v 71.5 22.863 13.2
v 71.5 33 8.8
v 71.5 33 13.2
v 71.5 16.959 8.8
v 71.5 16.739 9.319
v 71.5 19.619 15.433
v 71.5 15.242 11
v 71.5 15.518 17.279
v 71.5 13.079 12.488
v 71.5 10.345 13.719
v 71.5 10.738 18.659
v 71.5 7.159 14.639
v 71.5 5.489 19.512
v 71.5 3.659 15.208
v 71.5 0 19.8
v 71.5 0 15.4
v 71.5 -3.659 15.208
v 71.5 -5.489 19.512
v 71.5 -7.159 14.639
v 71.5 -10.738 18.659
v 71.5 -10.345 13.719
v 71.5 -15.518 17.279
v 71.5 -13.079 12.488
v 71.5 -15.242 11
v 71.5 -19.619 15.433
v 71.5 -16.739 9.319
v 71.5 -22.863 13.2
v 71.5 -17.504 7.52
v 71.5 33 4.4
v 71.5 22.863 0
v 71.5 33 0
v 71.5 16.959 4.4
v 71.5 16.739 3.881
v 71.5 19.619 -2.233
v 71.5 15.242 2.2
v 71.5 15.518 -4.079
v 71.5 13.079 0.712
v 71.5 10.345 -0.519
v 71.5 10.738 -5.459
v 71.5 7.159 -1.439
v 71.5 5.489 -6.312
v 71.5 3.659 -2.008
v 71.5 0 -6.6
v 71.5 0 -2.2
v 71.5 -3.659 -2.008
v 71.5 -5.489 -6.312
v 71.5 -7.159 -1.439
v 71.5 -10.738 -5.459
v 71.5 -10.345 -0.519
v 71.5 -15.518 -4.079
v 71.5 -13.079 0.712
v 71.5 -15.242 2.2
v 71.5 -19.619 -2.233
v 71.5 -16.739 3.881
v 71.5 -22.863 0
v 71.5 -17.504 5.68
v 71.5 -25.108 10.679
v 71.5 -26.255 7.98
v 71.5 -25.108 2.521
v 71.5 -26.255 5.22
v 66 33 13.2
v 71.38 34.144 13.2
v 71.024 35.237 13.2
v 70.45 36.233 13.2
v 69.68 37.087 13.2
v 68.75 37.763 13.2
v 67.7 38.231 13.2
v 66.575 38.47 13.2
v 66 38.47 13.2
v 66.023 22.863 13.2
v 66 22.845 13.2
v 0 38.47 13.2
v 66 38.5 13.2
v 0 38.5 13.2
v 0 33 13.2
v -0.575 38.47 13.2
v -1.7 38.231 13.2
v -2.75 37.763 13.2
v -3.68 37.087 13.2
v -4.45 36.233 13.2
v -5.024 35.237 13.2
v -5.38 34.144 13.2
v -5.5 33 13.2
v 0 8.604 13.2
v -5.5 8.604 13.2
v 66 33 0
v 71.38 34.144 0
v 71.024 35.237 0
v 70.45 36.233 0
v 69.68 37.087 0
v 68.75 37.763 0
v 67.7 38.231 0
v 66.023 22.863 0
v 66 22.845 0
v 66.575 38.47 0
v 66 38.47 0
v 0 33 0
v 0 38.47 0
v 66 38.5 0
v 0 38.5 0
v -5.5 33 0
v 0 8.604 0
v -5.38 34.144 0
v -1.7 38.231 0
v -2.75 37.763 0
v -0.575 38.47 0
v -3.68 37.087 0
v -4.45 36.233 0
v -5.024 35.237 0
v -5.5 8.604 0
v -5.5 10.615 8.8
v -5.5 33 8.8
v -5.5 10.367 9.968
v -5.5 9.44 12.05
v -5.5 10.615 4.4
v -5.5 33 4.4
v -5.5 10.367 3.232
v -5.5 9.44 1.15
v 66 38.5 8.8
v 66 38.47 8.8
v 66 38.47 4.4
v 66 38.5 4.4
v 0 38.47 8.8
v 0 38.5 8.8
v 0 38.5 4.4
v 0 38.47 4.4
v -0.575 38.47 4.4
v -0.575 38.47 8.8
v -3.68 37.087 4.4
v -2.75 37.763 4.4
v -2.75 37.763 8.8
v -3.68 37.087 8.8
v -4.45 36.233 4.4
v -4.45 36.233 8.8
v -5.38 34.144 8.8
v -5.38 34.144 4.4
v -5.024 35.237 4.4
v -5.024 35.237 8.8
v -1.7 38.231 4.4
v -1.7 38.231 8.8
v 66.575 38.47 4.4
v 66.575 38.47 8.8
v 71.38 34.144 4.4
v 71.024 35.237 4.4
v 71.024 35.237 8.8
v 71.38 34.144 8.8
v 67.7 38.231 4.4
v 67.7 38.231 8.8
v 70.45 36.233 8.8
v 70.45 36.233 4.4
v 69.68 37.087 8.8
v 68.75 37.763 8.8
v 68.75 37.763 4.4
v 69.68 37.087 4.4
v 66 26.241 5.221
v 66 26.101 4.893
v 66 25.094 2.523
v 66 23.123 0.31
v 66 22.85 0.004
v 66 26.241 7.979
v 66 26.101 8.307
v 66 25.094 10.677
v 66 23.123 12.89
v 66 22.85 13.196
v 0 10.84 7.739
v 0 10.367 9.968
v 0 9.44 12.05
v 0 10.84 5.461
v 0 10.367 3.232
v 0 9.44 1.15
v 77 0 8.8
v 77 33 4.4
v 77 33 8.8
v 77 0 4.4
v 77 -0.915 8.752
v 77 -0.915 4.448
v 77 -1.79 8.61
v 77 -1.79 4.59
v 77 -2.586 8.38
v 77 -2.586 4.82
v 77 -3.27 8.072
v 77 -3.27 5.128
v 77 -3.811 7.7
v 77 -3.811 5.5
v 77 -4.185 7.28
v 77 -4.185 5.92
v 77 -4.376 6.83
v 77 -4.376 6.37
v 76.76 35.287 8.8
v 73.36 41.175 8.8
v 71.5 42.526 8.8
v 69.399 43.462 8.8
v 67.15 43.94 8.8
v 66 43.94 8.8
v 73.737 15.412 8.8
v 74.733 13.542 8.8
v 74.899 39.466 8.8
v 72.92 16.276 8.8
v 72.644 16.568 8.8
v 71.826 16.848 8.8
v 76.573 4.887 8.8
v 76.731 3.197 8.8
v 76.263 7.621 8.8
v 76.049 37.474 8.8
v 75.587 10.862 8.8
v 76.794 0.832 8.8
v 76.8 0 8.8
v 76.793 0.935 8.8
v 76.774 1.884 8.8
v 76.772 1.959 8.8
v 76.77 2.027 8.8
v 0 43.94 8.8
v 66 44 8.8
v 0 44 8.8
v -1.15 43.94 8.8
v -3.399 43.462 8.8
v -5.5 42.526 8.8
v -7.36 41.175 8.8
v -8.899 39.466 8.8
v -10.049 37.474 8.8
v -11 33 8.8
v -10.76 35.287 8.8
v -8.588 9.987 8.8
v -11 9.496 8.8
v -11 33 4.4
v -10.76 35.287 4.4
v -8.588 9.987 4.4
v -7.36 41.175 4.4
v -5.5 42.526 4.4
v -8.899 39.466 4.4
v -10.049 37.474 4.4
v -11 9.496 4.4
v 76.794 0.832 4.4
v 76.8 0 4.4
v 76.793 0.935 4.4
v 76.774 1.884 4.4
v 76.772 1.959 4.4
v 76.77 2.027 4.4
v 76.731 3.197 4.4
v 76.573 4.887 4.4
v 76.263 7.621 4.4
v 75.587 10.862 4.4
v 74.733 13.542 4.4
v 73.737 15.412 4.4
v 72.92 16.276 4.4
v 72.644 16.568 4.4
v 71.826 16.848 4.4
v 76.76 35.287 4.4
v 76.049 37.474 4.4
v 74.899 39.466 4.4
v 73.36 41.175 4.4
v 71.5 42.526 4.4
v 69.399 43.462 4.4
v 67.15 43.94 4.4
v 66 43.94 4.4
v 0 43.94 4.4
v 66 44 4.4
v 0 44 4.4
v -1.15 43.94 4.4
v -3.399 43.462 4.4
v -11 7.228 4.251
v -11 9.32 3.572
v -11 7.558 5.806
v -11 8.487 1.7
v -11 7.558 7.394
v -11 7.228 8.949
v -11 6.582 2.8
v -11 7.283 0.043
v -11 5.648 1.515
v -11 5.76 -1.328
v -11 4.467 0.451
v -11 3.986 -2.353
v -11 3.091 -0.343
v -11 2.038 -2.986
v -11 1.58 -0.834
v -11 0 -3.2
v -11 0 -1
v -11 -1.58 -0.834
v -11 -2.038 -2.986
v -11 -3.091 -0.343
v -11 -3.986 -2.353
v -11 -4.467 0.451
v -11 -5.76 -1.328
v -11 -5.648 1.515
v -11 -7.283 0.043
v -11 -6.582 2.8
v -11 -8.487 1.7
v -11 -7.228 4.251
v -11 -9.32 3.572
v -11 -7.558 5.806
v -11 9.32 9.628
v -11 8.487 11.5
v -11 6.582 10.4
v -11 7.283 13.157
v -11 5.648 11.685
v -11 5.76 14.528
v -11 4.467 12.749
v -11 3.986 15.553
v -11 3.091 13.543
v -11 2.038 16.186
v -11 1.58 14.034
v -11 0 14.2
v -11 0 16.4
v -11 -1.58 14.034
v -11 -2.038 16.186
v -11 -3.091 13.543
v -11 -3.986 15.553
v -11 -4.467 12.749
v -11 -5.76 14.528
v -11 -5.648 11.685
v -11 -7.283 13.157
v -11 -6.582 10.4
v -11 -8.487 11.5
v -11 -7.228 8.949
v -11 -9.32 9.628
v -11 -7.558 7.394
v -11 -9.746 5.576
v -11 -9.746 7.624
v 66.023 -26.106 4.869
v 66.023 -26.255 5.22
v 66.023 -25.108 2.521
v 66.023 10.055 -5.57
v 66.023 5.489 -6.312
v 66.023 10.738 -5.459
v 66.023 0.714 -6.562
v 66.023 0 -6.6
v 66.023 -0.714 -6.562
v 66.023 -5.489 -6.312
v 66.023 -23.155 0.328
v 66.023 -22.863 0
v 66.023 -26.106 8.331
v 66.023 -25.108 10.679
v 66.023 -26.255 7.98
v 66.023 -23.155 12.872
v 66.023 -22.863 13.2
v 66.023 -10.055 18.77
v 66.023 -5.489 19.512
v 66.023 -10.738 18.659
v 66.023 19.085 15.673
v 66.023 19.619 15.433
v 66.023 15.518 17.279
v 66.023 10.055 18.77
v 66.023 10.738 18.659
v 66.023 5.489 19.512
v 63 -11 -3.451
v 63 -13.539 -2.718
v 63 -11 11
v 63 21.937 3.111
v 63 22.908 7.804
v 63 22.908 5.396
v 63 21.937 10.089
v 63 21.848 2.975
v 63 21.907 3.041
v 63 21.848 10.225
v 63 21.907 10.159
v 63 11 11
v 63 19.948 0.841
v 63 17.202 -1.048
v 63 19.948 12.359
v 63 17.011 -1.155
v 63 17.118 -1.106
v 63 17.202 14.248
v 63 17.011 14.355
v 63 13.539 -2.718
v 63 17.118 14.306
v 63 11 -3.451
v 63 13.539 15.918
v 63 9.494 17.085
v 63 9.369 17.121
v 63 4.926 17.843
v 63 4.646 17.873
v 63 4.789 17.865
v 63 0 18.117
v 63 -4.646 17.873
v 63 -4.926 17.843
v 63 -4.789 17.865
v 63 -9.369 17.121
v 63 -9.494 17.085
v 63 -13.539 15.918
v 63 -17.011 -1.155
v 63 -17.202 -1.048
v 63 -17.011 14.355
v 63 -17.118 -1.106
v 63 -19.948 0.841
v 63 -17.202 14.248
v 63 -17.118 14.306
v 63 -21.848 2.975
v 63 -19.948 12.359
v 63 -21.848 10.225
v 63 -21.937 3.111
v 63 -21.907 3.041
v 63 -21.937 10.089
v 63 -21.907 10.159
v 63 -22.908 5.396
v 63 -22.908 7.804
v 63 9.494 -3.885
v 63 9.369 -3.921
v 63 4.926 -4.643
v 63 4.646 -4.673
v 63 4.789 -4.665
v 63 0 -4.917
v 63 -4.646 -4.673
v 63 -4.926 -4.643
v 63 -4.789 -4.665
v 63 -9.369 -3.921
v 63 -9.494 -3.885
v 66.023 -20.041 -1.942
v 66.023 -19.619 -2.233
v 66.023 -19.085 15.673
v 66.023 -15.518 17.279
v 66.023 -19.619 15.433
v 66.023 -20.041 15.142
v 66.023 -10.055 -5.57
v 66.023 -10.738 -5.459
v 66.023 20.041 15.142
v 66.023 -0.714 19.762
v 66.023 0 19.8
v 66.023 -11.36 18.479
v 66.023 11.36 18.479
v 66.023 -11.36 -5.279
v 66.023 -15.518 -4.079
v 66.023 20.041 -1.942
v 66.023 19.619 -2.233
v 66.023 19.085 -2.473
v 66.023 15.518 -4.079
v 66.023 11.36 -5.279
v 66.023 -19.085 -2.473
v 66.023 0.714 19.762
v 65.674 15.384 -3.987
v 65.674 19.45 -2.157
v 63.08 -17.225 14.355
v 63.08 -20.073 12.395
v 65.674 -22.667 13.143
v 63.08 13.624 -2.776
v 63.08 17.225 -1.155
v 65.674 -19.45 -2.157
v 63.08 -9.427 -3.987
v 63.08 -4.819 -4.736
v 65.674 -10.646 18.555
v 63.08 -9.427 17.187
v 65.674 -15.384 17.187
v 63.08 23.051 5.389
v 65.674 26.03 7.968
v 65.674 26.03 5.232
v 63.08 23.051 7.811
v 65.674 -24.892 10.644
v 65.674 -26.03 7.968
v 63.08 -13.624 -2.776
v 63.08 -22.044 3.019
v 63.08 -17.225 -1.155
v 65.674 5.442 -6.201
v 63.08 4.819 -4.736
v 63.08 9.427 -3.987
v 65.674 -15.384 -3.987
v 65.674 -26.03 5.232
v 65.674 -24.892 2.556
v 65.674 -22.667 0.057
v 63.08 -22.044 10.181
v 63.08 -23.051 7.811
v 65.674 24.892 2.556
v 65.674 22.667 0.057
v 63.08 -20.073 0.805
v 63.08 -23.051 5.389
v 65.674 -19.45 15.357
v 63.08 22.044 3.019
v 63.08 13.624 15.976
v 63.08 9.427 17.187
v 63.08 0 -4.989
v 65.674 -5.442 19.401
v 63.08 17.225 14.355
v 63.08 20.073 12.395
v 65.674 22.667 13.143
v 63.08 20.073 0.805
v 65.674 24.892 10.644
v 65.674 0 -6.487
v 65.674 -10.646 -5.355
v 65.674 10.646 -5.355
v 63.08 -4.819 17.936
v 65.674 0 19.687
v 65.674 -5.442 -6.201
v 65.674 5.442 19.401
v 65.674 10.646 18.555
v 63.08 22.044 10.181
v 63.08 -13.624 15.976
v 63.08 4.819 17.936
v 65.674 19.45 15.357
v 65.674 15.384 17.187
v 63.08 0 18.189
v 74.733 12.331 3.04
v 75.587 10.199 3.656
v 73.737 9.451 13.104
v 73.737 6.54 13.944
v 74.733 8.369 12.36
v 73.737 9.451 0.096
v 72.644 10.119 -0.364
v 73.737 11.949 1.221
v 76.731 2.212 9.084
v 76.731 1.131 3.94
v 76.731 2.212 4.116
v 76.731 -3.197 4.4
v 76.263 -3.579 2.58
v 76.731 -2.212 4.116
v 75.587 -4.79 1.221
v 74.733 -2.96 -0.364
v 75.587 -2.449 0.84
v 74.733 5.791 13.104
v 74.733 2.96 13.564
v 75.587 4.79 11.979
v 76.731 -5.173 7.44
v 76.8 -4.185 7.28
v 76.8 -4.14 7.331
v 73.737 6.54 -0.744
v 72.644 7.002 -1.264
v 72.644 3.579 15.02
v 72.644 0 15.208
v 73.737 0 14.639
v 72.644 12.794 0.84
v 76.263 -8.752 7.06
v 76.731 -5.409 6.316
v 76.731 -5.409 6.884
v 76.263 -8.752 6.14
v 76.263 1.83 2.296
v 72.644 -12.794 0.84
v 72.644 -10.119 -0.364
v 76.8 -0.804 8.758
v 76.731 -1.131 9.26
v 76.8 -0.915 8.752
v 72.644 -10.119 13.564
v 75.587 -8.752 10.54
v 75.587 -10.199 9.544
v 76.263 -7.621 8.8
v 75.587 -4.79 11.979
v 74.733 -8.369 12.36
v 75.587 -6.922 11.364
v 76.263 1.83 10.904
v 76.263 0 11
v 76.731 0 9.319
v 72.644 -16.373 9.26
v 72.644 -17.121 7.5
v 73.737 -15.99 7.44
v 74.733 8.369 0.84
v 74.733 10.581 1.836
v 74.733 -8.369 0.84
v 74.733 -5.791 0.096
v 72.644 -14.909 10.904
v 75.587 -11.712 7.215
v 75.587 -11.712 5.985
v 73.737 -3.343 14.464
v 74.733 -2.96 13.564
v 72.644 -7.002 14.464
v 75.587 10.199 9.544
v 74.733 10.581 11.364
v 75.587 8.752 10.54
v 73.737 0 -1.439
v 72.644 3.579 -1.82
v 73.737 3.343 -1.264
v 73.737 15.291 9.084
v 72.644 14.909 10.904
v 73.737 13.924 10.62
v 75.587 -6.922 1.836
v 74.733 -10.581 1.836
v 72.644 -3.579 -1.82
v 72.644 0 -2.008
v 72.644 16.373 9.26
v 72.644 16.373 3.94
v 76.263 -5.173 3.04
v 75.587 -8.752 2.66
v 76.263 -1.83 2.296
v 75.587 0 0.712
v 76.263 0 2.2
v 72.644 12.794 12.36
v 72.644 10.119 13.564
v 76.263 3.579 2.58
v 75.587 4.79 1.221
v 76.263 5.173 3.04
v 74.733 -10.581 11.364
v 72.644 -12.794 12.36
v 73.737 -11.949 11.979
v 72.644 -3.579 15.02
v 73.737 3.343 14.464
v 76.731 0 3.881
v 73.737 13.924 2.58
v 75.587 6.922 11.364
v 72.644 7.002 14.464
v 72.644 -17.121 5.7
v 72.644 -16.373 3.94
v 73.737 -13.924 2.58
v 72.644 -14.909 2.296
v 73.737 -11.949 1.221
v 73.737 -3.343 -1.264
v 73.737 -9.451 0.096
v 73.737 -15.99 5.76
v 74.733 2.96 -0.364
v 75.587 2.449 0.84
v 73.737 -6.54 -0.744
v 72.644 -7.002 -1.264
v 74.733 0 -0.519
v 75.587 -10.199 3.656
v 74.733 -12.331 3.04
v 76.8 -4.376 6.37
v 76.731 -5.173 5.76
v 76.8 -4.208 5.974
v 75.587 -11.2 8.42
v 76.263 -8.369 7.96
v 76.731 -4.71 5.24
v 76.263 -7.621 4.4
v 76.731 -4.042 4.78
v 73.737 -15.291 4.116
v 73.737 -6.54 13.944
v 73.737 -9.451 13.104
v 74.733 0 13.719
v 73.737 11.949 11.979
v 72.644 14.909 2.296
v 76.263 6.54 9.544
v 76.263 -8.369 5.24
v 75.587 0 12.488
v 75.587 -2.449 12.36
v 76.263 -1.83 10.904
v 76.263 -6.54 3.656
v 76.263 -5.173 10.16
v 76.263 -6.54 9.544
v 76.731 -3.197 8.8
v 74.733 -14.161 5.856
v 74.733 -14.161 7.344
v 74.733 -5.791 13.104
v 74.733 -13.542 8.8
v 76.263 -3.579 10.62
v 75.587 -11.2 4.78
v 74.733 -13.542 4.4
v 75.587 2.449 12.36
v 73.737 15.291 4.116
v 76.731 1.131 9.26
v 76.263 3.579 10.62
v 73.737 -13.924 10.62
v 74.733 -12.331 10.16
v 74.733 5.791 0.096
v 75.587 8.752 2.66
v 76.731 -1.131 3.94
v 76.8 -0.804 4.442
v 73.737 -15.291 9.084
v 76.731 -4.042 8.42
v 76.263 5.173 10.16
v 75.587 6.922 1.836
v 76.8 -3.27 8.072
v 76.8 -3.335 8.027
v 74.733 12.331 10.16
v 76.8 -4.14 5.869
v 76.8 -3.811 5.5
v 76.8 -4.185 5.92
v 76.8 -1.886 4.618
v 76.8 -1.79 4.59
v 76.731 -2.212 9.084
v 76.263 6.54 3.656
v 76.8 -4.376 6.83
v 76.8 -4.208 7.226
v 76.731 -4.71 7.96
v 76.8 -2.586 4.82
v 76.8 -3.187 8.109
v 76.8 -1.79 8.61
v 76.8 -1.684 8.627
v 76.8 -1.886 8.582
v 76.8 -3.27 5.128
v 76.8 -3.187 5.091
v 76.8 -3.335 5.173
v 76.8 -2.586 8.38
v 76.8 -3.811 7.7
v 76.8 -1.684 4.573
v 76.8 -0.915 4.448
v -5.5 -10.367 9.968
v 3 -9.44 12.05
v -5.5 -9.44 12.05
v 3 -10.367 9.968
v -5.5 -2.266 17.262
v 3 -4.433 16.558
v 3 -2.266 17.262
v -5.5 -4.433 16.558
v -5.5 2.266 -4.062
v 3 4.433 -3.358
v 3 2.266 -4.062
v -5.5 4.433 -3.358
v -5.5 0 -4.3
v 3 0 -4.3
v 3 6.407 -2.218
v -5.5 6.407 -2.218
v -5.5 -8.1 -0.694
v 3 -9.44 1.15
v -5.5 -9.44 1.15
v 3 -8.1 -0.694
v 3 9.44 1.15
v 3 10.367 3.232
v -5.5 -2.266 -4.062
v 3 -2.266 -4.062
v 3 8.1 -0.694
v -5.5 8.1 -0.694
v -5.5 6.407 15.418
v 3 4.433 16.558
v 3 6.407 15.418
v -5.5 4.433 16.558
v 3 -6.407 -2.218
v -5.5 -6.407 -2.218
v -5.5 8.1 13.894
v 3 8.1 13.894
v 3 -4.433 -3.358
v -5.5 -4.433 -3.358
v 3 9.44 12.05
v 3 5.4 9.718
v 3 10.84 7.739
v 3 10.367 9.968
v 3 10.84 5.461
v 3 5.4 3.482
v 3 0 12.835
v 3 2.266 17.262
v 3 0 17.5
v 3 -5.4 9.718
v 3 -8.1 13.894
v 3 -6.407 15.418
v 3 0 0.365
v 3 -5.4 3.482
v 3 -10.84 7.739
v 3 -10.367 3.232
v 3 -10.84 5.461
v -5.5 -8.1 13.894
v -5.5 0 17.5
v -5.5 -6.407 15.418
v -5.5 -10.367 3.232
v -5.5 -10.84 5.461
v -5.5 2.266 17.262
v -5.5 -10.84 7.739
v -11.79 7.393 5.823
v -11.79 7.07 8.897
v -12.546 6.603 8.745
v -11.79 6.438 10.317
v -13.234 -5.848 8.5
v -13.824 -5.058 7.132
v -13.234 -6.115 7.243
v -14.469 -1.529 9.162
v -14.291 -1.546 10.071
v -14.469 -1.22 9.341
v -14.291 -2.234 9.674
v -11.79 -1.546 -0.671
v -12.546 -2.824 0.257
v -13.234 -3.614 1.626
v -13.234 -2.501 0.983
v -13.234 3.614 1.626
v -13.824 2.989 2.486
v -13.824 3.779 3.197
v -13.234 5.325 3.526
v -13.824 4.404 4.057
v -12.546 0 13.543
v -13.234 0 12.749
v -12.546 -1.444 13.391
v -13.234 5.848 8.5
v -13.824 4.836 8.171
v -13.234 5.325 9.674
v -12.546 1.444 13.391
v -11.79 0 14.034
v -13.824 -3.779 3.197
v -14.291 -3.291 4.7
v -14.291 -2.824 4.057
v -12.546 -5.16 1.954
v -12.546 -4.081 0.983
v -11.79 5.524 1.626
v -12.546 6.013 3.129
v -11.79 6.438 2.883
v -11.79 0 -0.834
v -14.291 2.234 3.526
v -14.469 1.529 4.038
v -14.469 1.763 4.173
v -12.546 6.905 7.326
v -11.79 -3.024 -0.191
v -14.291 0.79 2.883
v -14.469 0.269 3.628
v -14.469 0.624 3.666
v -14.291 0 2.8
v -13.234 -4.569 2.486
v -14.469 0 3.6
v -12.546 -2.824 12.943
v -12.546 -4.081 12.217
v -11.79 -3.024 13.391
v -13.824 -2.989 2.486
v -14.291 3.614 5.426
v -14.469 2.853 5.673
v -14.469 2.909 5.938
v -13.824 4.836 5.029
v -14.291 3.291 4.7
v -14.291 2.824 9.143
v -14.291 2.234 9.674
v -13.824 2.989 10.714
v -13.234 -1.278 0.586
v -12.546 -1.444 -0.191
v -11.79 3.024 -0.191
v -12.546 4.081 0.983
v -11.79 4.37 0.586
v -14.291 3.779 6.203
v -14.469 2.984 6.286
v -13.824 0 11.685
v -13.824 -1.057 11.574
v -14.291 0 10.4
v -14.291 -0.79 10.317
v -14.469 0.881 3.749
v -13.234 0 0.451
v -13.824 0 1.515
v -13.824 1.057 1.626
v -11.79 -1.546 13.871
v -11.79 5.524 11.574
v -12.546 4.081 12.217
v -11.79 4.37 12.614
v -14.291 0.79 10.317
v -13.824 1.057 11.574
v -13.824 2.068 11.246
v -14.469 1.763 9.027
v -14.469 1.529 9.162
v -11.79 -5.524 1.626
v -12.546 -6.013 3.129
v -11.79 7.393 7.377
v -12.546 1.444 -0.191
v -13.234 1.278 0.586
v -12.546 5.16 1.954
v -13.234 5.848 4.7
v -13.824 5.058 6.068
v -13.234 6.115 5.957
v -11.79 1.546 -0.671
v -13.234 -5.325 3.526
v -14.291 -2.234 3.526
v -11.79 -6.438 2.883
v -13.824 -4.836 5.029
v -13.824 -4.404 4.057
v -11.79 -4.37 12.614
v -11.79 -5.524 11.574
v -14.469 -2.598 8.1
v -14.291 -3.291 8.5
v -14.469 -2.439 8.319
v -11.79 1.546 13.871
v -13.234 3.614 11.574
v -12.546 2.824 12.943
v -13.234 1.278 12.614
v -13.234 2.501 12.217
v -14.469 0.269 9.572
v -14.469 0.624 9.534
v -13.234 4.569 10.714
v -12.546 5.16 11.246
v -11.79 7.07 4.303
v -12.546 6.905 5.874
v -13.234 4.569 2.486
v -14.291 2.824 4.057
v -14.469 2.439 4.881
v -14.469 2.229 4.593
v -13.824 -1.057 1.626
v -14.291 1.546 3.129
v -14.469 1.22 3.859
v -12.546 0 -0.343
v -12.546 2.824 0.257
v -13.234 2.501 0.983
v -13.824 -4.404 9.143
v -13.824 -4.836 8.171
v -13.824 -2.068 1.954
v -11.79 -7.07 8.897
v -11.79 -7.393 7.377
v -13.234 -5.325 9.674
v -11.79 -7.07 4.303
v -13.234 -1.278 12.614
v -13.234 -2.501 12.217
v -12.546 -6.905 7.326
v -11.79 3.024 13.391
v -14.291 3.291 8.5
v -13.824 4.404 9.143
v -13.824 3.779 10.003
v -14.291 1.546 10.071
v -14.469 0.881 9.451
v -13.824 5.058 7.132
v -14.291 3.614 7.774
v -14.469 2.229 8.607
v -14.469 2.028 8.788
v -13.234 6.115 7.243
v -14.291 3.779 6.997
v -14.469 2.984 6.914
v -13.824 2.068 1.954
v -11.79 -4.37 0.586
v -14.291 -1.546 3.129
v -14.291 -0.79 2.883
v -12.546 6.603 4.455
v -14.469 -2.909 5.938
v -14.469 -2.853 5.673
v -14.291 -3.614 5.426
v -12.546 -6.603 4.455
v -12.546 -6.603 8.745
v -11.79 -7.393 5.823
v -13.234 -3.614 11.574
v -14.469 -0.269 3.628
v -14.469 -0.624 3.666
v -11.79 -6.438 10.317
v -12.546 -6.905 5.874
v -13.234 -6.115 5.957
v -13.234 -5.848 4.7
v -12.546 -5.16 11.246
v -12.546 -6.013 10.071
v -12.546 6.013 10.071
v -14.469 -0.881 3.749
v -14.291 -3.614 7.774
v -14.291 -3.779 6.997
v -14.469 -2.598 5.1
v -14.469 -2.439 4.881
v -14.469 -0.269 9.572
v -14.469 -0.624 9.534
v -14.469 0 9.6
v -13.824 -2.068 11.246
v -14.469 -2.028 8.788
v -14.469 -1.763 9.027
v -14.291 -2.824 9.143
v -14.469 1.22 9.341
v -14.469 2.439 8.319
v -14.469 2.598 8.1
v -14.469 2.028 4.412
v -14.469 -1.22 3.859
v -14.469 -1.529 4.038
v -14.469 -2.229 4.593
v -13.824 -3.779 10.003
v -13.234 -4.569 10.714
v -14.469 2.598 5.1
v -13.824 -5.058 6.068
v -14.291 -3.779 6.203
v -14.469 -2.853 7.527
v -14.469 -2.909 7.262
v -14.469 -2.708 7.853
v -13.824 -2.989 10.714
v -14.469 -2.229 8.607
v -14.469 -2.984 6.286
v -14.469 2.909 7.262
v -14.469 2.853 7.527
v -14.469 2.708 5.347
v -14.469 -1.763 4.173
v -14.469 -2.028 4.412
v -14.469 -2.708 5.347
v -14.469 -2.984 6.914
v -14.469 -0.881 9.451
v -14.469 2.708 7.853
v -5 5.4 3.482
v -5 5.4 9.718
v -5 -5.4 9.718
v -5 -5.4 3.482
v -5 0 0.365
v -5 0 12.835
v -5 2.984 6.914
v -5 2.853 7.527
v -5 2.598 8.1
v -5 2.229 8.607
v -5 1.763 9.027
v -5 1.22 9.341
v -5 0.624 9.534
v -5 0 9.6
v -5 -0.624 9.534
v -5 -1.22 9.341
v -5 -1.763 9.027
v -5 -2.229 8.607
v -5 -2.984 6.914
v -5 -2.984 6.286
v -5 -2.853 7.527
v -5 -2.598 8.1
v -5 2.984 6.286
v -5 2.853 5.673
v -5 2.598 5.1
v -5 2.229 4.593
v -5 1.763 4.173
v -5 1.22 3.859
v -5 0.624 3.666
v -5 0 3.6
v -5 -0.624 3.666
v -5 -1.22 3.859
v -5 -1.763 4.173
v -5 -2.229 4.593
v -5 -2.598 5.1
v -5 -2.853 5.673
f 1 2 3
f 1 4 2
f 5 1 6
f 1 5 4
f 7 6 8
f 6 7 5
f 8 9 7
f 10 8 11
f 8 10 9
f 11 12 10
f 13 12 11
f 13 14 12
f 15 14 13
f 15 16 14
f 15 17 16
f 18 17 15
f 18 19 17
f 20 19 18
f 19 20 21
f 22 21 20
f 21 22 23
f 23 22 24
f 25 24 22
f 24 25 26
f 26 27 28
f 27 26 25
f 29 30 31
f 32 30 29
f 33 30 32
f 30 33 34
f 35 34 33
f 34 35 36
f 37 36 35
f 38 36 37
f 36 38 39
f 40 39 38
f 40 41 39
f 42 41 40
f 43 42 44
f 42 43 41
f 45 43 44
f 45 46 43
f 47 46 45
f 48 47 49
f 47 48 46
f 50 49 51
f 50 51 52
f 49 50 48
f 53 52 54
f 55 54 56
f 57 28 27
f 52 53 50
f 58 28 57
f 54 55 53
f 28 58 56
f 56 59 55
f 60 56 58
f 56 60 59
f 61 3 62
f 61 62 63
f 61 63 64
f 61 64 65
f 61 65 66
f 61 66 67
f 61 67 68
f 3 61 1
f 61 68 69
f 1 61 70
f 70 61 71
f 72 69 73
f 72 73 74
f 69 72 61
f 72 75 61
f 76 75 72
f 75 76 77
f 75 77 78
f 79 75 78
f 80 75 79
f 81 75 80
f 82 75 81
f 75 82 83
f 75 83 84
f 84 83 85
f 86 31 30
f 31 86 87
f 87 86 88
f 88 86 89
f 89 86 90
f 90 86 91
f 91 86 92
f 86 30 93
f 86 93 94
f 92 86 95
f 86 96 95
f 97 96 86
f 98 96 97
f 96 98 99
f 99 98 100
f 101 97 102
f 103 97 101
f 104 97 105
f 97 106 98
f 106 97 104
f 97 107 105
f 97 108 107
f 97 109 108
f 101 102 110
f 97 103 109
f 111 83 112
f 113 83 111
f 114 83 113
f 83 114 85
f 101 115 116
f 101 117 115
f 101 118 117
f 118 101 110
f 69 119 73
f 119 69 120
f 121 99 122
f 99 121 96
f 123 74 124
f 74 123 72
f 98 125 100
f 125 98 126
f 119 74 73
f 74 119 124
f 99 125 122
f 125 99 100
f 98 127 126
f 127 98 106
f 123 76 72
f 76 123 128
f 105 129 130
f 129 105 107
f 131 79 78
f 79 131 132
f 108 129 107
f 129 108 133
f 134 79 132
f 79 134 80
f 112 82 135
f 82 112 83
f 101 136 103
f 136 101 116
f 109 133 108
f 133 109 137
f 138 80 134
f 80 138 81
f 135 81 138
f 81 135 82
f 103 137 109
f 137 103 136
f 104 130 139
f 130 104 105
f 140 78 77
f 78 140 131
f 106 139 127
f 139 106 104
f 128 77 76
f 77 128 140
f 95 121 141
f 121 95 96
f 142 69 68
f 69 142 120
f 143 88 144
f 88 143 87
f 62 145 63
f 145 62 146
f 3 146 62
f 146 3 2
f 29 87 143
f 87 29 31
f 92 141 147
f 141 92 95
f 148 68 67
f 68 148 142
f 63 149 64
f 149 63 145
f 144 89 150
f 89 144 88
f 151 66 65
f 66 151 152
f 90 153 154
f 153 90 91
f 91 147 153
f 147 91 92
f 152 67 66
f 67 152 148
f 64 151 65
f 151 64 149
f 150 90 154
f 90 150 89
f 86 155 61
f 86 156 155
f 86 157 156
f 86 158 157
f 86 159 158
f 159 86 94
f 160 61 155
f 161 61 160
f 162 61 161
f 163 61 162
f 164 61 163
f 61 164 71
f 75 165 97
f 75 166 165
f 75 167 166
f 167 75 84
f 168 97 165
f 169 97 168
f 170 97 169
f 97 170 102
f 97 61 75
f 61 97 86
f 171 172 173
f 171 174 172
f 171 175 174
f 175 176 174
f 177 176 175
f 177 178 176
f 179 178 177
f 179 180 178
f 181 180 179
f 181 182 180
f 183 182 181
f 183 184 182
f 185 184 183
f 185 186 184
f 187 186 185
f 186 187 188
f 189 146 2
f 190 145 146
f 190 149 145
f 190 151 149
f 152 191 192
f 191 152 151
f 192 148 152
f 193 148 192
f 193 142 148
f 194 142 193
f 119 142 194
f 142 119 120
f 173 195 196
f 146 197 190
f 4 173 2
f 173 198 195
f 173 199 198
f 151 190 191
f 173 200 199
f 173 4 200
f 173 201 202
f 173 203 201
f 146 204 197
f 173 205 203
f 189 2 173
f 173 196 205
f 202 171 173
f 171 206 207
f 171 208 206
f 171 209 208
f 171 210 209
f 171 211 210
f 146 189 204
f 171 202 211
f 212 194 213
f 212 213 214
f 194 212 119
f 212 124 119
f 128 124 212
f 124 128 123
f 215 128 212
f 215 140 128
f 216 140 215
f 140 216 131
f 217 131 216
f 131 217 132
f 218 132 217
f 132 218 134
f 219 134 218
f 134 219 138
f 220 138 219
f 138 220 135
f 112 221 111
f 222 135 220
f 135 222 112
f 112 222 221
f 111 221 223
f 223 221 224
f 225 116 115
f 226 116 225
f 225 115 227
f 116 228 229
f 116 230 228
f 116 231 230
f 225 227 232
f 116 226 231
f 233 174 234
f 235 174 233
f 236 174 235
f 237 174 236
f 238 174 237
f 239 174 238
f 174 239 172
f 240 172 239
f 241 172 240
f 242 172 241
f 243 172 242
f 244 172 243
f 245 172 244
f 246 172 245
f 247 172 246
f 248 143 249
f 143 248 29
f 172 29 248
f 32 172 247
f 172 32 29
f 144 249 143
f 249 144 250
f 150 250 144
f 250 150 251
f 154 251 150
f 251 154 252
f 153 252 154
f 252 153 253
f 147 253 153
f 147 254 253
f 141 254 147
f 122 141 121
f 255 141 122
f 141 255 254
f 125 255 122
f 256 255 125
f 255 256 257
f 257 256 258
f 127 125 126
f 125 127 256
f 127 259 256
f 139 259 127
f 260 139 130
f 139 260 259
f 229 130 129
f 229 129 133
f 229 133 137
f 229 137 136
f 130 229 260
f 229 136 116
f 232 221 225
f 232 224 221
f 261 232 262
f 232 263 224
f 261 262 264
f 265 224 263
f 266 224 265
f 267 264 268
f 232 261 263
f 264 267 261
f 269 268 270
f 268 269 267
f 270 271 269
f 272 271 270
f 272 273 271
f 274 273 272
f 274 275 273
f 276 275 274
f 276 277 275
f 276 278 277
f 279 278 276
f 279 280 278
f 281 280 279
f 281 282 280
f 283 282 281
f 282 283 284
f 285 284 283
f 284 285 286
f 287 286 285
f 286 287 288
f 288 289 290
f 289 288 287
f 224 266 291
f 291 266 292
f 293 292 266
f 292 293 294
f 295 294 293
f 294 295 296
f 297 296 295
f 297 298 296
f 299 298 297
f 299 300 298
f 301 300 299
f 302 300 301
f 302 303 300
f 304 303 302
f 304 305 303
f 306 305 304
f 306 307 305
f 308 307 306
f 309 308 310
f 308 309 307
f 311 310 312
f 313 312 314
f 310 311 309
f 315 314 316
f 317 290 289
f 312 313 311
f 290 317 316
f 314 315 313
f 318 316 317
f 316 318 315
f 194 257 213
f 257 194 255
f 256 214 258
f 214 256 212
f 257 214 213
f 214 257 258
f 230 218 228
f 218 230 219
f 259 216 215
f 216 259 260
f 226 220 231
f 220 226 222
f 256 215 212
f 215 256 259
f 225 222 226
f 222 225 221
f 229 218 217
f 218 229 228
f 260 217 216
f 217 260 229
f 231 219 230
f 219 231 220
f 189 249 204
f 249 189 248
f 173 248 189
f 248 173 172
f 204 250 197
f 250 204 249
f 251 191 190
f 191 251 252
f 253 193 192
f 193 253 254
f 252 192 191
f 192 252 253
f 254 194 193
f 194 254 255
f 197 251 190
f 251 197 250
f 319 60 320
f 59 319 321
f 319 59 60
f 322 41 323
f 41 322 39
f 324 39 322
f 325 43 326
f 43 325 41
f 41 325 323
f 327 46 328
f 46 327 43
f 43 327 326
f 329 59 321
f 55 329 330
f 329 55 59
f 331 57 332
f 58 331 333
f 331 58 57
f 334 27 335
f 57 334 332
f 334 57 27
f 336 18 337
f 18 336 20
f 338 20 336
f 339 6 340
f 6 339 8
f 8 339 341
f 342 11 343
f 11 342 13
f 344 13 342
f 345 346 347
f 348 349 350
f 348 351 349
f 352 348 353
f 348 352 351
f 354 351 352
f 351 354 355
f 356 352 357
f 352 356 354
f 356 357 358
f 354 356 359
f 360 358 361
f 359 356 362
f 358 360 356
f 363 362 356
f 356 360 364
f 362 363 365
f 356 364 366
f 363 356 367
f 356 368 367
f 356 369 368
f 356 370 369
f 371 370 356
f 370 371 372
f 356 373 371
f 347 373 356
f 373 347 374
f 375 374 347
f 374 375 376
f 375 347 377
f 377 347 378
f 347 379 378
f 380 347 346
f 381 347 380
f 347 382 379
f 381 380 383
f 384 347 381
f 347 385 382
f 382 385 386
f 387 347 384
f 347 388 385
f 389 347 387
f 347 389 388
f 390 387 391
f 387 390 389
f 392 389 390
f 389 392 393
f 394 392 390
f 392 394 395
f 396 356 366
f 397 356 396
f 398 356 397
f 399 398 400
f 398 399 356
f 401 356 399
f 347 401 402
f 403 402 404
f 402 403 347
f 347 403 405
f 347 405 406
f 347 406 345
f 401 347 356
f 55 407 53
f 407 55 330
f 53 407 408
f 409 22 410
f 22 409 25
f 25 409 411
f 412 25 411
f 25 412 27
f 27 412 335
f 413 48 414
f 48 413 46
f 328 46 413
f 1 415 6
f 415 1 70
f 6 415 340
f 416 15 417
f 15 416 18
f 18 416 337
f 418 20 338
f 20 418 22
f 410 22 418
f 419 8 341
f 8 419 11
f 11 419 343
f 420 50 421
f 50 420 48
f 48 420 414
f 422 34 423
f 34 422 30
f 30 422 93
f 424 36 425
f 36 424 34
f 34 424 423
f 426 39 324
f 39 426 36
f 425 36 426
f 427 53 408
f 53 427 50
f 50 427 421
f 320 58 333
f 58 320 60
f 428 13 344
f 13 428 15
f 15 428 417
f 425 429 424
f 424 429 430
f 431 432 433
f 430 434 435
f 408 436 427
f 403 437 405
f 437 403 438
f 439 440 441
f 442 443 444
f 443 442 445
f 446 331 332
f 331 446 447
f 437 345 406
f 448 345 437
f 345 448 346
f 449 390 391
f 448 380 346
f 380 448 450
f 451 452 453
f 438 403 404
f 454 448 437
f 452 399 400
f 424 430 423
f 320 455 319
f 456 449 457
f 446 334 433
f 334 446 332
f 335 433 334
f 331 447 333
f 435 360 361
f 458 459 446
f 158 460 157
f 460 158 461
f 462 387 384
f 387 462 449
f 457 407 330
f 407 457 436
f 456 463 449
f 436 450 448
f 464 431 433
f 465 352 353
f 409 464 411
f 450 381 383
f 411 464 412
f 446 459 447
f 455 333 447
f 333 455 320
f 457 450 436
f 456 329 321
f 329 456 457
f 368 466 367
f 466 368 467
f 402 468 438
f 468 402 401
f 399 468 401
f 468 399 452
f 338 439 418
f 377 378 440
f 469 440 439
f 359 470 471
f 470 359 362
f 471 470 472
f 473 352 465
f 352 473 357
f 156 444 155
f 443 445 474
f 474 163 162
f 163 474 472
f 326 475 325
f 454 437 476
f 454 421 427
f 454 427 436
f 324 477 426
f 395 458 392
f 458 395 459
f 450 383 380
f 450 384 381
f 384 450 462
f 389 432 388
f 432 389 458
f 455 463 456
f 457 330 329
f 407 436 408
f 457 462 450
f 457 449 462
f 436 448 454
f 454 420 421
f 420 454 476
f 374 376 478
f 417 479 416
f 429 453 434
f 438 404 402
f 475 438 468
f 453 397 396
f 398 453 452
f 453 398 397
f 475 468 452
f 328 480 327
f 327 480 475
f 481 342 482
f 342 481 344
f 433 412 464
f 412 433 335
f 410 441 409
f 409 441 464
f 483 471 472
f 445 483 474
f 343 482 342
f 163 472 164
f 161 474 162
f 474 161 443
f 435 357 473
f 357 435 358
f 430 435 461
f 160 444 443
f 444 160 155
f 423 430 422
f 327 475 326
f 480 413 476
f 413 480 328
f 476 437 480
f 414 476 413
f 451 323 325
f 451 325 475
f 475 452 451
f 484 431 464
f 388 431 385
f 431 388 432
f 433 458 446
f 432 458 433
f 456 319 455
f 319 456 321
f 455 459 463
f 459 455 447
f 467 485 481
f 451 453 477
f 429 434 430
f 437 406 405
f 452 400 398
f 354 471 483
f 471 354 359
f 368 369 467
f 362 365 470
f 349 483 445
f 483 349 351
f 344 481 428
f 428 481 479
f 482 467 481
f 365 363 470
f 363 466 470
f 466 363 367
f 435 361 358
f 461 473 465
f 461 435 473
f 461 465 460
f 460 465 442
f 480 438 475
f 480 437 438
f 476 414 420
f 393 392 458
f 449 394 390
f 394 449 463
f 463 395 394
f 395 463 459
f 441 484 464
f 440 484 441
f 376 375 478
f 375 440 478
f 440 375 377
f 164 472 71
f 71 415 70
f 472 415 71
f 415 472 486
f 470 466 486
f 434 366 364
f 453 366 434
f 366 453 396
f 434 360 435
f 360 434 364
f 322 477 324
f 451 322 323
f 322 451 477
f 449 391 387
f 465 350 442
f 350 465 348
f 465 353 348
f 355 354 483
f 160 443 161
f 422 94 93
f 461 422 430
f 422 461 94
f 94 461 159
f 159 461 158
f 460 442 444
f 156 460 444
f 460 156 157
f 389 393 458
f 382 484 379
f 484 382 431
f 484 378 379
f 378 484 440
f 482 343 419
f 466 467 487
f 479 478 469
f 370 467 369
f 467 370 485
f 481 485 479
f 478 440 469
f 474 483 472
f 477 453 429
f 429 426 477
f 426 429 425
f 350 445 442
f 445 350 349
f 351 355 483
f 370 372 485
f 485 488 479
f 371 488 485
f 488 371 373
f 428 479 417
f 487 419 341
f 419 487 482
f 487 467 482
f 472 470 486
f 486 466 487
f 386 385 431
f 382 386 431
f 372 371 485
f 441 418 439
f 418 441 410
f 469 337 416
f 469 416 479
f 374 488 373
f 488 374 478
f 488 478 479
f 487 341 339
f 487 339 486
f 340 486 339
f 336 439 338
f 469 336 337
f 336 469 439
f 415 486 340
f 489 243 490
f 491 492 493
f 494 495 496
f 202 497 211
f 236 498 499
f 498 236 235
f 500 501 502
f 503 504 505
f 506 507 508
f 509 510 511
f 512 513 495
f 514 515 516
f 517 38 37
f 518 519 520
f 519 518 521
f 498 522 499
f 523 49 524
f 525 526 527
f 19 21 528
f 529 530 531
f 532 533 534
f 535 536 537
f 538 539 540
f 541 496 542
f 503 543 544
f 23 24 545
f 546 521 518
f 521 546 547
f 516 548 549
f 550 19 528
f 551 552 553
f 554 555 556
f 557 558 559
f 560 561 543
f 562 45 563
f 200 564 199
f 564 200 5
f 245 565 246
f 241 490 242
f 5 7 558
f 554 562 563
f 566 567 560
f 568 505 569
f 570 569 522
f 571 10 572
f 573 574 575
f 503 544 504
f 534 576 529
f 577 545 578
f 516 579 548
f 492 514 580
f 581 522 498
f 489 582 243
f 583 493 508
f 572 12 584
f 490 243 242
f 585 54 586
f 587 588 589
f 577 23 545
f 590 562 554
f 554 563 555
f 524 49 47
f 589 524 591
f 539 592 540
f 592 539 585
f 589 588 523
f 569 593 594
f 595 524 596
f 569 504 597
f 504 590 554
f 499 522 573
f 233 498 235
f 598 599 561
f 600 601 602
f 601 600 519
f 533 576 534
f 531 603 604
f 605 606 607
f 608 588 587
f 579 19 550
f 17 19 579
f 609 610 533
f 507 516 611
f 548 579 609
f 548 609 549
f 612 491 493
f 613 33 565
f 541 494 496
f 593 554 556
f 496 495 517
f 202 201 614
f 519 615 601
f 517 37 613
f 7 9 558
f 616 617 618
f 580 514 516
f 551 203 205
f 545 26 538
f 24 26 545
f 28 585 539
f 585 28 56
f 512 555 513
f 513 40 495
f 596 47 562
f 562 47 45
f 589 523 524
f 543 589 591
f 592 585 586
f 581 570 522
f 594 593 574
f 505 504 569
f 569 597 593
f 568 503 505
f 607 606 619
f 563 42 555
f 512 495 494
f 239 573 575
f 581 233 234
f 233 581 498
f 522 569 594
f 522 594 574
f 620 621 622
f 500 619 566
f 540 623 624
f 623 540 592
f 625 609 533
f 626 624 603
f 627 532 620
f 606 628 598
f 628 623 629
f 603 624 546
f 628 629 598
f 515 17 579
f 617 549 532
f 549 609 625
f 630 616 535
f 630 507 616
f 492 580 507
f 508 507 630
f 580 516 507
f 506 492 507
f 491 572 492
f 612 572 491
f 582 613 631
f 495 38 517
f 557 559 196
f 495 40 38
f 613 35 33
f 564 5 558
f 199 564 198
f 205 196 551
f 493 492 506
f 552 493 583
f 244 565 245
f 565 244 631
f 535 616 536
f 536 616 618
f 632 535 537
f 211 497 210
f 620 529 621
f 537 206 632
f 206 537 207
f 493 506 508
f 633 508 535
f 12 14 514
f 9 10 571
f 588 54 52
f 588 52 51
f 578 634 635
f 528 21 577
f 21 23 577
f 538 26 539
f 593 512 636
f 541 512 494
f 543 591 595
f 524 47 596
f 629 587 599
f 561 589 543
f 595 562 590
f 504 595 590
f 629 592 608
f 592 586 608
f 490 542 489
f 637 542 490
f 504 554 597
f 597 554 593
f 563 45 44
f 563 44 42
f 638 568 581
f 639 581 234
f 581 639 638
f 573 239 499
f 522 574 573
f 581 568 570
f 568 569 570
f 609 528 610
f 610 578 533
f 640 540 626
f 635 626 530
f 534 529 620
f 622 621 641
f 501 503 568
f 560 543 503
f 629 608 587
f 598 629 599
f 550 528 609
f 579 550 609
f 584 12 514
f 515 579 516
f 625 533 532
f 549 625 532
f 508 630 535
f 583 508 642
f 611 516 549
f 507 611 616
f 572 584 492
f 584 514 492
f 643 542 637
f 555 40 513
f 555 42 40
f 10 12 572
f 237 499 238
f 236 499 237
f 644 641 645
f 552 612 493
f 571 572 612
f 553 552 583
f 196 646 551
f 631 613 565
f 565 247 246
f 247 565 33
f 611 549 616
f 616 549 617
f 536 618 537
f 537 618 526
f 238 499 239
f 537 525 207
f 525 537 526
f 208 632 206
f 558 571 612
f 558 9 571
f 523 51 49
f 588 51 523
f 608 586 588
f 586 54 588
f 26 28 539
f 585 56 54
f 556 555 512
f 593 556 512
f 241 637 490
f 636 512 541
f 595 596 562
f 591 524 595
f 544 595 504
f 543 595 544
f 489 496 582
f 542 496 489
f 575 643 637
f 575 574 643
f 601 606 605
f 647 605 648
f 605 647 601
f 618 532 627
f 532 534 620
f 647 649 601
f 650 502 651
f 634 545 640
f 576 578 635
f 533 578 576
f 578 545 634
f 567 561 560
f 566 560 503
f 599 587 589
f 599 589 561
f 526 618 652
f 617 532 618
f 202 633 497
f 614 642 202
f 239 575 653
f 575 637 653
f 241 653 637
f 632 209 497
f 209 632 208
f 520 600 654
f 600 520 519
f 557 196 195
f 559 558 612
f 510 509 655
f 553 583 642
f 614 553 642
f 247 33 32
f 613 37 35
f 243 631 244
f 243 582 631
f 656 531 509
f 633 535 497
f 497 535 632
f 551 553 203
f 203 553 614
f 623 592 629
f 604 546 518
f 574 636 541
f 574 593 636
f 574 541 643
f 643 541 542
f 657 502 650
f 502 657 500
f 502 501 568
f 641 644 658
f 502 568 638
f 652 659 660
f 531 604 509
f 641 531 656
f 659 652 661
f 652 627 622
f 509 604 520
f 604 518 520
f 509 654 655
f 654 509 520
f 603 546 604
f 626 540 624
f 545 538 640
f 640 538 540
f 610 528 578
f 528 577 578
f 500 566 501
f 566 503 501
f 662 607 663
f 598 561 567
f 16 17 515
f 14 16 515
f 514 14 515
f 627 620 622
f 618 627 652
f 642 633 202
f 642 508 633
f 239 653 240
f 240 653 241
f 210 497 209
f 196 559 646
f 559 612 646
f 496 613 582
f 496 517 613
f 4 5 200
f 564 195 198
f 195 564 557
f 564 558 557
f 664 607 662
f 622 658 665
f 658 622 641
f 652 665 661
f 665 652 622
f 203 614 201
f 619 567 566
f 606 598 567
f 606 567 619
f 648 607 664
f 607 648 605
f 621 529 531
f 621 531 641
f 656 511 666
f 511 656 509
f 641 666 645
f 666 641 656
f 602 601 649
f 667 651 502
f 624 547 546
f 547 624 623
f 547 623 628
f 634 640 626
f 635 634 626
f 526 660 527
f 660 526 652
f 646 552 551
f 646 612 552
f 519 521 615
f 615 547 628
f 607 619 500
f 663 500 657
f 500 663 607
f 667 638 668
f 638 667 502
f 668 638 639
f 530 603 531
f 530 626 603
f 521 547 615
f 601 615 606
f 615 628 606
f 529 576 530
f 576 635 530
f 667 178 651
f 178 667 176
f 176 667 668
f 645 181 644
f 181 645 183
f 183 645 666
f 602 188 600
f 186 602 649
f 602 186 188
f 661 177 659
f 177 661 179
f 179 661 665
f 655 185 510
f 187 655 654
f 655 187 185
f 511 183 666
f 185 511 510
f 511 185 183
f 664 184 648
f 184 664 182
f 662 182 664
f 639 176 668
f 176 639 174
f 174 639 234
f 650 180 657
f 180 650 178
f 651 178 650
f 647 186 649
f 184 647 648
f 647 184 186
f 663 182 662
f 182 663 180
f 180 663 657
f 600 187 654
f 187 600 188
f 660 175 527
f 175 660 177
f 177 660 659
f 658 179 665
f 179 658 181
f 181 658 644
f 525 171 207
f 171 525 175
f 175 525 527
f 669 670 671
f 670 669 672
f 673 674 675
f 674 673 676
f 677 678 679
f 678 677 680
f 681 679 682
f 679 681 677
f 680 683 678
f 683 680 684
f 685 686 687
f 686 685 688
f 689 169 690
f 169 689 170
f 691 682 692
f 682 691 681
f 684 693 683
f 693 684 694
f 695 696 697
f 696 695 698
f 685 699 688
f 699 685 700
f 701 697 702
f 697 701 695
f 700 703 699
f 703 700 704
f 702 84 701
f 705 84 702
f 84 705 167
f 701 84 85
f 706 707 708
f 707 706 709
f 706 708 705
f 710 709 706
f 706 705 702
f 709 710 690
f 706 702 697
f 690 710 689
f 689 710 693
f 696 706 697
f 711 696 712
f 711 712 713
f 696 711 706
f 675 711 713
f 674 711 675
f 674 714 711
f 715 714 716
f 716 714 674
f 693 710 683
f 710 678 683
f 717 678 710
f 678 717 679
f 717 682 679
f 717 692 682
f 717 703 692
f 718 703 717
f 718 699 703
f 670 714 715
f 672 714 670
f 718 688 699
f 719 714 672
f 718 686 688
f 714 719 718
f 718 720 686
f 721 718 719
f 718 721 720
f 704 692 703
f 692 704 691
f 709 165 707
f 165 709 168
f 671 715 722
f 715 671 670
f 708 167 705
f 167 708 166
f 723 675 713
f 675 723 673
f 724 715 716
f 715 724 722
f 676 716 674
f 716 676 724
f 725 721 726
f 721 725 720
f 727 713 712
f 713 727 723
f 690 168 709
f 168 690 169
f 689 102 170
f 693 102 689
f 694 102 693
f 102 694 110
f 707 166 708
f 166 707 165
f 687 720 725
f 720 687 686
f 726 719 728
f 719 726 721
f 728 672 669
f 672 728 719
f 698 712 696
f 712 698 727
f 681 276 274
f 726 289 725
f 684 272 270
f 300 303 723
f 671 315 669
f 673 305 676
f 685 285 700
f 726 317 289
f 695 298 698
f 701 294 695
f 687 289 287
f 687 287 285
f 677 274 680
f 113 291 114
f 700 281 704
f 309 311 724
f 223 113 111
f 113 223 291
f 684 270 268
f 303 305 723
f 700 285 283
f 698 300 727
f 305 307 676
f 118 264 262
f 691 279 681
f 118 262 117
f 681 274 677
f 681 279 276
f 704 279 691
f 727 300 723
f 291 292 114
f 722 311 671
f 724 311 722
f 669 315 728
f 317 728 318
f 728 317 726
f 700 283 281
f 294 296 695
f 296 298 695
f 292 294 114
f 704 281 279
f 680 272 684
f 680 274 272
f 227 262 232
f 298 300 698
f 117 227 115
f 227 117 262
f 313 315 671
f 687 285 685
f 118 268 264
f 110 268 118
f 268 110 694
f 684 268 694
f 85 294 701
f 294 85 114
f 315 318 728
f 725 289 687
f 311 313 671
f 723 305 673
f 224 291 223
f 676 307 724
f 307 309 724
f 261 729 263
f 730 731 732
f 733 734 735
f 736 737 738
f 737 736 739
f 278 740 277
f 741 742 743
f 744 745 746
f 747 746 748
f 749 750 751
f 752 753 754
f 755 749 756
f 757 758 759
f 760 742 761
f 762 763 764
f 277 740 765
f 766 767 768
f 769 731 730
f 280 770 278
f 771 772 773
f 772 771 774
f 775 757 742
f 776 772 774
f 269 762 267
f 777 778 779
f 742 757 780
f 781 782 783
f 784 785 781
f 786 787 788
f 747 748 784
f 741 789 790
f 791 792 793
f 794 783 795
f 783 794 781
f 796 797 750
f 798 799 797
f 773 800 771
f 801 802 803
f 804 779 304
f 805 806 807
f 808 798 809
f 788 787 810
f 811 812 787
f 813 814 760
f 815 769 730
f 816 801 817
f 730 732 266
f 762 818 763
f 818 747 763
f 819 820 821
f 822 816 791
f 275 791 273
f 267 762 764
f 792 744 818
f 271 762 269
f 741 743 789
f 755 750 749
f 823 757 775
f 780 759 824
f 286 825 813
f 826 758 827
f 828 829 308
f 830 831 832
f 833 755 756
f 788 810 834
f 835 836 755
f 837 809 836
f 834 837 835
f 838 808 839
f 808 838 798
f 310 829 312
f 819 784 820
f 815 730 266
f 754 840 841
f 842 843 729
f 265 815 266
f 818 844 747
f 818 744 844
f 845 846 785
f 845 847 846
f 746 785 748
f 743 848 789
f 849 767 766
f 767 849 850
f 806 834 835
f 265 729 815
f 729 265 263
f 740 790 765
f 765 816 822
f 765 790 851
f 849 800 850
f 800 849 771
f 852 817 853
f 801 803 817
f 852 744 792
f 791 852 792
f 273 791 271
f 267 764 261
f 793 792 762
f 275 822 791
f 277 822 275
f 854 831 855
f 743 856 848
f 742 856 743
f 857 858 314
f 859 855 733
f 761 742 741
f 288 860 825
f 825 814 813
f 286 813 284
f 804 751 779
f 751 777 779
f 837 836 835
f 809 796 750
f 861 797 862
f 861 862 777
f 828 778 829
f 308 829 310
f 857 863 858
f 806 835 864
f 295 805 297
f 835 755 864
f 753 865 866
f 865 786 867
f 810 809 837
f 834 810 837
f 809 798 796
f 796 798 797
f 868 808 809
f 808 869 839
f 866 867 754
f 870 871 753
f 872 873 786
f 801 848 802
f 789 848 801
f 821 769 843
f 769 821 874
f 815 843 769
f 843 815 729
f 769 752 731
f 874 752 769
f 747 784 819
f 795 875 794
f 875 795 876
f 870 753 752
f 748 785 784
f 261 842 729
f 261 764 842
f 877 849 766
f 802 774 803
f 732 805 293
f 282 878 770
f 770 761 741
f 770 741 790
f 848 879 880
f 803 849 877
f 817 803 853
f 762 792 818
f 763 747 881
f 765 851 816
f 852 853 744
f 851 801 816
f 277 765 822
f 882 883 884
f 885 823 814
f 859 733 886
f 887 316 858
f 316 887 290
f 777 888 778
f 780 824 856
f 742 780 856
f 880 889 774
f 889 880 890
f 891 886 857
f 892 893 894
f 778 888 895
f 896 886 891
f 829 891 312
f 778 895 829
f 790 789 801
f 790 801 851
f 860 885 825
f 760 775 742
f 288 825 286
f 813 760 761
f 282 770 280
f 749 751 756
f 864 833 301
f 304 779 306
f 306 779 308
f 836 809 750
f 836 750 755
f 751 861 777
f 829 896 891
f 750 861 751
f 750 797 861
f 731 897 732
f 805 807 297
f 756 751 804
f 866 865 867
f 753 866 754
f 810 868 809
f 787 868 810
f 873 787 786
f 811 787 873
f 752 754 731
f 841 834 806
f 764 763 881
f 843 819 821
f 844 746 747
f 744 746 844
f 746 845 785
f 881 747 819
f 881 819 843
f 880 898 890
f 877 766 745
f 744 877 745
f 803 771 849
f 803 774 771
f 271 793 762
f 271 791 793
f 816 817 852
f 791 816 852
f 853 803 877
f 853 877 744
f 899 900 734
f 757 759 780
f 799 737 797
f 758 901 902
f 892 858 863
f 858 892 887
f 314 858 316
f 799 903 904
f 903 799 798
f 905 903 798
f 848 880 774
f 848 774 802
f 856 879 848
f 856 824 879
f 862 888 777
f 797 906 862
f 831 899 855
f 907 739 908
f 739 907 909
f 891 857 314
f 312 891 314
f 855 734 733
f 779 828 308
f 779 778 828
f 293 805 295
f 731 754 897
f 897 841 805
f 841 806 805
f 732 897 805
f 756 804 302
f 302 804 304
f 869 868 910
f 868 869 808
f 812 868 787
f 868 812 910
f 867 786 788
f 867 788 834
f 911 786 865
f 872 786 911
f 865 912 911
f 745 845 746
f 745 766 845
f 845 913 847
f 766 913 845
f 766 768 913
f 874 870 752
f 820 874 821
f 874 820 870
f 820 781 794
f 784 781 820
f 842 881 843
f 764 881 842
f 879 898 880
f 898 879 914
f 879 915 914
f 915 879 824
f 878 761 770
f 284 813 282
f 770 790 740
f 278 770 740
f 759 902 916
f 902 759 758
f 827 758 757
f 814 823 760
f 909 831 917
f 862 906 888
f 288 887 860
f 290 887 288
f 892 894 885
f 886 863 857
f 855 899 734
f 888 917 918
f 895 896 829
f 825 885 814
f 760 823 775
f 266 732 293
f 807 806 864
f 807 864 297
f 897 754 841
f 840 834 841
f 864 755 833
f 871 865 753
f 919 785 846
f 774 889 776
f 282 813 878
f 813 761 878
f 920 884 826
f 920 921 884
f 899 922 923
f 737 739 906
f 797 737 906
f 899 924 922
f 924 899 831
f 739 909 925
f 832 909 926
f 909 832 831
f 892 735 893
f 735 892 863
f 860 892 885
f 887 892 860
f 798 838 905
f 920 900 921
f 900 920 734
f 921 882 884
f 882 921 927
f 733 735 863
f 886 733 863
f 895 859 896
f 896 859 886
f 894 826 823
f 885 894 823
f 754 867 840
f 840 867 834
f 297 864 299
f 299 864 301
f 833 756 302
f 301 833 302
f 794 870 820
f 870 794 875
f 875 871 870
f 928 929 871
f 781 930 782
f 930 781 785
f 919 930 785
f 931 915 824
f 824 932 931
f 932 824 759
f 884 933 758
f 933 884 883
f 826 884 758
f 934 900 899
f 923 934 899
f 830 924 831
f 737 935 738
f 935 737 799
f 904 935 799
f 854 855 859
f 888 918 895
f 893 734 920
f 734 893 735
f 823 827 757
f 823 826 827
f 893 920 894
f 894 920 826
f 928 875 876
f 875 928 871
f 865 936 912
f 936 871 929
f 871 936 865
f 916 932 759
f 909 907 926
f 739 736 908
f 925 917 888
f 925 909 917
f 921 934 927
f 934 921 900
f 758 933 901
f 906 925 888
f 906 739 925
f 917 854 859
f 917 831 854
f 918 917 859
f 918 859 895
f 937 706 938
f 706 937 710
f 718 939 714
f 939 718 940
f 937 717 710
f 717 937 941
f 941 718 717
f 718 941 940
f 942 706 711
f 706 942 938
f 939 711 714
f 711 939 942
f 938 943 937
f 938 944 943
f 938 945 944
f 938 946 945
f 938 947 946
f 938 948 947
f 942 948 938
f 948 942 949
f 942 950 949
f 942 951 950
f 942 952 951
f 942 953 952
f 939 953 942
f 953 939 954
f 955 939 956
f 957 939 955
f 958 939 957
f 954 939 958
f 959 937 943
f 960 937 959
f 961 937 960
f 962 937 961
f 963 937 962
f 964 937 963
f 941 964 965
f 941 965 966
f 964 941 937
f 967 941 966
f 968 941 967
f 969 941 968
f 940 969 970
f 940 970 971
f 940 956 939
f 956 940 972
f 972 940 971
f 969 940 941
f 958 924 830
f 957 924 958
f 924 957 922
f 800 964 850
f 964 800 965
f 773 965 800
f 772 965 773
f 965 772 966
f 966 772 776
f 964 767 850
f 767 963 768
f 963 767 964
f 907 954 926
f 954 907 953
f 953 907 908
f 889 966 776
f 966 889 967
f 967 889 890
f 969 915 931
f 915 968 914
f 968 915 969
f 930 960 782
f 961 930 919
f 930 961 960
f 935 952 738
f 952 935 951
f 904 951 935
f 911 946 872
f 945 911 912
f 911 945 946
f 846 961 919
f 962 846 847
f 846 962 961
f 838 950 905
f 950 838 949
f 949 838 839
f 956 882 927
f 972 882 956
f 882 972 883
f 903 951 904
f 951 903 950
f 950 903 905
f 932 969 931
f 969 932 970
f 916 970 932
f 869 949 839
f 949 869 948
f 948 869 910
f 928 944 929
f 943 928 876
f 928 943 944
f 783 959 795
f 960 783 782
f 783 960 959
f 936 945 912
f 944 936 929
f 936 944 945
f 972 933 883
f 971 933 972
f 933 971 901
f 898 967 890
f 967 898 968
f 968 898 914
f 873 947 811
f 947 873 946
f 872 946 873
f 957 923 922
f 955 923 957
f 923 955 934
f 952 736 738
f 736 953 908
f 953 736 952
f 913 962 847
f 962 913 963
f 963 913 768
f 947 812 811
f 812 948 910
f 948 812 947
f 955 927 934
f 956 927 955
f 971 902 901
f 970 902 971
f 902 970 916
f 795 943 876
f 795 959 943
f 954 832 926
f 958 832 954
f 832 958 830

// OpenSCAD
//
//  Copyright (C) 05-05-2013 Jasper den Ouden.
//
//  This is free software: you can redistribute it and/or modify
//  it under the terms of the GNU General Public License as published
//  by the Free Software Foundation, either version 3 of the License, or
//  (at your option) any later version.
//

//M6 x 60
l = 60; //Length of bolt
br = 6/2; //Radius of bolt

nw = 10.8; // Nut width
nh = 6; //Nut height.
hh = 5; //Head height.

hl = 30; //Handle length.(minimum of 1.5*hh+ti)

//('advanced') params.
d = 1; //Extra.

hcl = 4; //'Head capture' room.

px = 3;

el = 10;
ehl = 6; //Space for end to hang on to.
fil = l + el - ehl - hcl + 2*px;

echo(fil+2*to);

w = fil/2;

hi = fil/5;
to = fil/6;
ho = hi/3;
ti = to/2;

pa = 7; //Angle to print it at. //TODO calculate it.
sr=1.2;

$fs=0.4;

f = 0.97;

module _screw_frame(t,h)
{
    difference()
    {   union()
        {   translate([-t,0]) cube([fil+2*t,w,h]);
            cube([fil,w+t,h]);
            translate([0,w]) cylinder(r=t,h=h);
            translate([fil,w]) cylinder(r=t,h=h);
        }
        translate([0,-w,-hi]) cube([fil,2*w,3*hi]);
    }
}

module hex_hole(w)
{
    difference()//Where it goes on the big nuts.
    {   circle(w); //Hex thing
        for( a= [30:60:390] ) rotate(a) translate([w,0]) square([w,w],center=true);
    }
}

ur = nw/2; //Radius near nut.

module rodend()
{
    r2=ur+ti; //br+to;
    difference()
    {   intersection()
        {   cylinder(r=r2, h=el);
            sphere(sqrt(r2*r2 + el*el)-to/8);
        }
        cylinder(r=br, h= ehl);
    }
}

//Gah openscad fucking up again.
module frame()
{
    r_a = sqrt(hi*hi + (px+ti)*(px+ti));
    difference()
    {   union()
        {   
            _screw_frame(ti,hi);
            translate([0,0,(hi-ho)/2]) _screw_frame(to,ho);
            
            translate([fil-px,0,hi/2]) rotate([0,90,0]) scale([1,2])
            {   intersection()
                {   cylinder(r=hi,h=px+ti);
                    translate([0,0,px+ti]) sphere(r_a-to/8);
                }
                translate([0,0,px+ti]) scale([2,2,(to-ti)/ho]) sphere(ho);
                cylinder(r=ho/2, h=px+to);
            }

            translate([0,0,hi/2]) rotate([0,90,0])  //Nut end.
            {   translate([0,0,-ti]) cylinder(r=ur + ti, h= ti+px);
                translate([0,0,-to]) cylinder(r1 = ur+ho, r2 = ur+ti, h= to-ti);
                translate([0,0,-to]) scale([1,1,1/2]) sphere(ur+ho/2);
            }
        }
        
        translate([fil-px-to,0,0]) cube(to*[2,2,2],center=true);
        translate([0,0,hi/2]) rotate([0,90,0]) 
        {   translate([0,0,px-nh-hcl/2]) linear_extrude(height= nh+nh) hex_hole(nw);
            
            translate([0,0,-w]) cylinder(r=br,h=2*w);
        }
        
    }
}

frame();
